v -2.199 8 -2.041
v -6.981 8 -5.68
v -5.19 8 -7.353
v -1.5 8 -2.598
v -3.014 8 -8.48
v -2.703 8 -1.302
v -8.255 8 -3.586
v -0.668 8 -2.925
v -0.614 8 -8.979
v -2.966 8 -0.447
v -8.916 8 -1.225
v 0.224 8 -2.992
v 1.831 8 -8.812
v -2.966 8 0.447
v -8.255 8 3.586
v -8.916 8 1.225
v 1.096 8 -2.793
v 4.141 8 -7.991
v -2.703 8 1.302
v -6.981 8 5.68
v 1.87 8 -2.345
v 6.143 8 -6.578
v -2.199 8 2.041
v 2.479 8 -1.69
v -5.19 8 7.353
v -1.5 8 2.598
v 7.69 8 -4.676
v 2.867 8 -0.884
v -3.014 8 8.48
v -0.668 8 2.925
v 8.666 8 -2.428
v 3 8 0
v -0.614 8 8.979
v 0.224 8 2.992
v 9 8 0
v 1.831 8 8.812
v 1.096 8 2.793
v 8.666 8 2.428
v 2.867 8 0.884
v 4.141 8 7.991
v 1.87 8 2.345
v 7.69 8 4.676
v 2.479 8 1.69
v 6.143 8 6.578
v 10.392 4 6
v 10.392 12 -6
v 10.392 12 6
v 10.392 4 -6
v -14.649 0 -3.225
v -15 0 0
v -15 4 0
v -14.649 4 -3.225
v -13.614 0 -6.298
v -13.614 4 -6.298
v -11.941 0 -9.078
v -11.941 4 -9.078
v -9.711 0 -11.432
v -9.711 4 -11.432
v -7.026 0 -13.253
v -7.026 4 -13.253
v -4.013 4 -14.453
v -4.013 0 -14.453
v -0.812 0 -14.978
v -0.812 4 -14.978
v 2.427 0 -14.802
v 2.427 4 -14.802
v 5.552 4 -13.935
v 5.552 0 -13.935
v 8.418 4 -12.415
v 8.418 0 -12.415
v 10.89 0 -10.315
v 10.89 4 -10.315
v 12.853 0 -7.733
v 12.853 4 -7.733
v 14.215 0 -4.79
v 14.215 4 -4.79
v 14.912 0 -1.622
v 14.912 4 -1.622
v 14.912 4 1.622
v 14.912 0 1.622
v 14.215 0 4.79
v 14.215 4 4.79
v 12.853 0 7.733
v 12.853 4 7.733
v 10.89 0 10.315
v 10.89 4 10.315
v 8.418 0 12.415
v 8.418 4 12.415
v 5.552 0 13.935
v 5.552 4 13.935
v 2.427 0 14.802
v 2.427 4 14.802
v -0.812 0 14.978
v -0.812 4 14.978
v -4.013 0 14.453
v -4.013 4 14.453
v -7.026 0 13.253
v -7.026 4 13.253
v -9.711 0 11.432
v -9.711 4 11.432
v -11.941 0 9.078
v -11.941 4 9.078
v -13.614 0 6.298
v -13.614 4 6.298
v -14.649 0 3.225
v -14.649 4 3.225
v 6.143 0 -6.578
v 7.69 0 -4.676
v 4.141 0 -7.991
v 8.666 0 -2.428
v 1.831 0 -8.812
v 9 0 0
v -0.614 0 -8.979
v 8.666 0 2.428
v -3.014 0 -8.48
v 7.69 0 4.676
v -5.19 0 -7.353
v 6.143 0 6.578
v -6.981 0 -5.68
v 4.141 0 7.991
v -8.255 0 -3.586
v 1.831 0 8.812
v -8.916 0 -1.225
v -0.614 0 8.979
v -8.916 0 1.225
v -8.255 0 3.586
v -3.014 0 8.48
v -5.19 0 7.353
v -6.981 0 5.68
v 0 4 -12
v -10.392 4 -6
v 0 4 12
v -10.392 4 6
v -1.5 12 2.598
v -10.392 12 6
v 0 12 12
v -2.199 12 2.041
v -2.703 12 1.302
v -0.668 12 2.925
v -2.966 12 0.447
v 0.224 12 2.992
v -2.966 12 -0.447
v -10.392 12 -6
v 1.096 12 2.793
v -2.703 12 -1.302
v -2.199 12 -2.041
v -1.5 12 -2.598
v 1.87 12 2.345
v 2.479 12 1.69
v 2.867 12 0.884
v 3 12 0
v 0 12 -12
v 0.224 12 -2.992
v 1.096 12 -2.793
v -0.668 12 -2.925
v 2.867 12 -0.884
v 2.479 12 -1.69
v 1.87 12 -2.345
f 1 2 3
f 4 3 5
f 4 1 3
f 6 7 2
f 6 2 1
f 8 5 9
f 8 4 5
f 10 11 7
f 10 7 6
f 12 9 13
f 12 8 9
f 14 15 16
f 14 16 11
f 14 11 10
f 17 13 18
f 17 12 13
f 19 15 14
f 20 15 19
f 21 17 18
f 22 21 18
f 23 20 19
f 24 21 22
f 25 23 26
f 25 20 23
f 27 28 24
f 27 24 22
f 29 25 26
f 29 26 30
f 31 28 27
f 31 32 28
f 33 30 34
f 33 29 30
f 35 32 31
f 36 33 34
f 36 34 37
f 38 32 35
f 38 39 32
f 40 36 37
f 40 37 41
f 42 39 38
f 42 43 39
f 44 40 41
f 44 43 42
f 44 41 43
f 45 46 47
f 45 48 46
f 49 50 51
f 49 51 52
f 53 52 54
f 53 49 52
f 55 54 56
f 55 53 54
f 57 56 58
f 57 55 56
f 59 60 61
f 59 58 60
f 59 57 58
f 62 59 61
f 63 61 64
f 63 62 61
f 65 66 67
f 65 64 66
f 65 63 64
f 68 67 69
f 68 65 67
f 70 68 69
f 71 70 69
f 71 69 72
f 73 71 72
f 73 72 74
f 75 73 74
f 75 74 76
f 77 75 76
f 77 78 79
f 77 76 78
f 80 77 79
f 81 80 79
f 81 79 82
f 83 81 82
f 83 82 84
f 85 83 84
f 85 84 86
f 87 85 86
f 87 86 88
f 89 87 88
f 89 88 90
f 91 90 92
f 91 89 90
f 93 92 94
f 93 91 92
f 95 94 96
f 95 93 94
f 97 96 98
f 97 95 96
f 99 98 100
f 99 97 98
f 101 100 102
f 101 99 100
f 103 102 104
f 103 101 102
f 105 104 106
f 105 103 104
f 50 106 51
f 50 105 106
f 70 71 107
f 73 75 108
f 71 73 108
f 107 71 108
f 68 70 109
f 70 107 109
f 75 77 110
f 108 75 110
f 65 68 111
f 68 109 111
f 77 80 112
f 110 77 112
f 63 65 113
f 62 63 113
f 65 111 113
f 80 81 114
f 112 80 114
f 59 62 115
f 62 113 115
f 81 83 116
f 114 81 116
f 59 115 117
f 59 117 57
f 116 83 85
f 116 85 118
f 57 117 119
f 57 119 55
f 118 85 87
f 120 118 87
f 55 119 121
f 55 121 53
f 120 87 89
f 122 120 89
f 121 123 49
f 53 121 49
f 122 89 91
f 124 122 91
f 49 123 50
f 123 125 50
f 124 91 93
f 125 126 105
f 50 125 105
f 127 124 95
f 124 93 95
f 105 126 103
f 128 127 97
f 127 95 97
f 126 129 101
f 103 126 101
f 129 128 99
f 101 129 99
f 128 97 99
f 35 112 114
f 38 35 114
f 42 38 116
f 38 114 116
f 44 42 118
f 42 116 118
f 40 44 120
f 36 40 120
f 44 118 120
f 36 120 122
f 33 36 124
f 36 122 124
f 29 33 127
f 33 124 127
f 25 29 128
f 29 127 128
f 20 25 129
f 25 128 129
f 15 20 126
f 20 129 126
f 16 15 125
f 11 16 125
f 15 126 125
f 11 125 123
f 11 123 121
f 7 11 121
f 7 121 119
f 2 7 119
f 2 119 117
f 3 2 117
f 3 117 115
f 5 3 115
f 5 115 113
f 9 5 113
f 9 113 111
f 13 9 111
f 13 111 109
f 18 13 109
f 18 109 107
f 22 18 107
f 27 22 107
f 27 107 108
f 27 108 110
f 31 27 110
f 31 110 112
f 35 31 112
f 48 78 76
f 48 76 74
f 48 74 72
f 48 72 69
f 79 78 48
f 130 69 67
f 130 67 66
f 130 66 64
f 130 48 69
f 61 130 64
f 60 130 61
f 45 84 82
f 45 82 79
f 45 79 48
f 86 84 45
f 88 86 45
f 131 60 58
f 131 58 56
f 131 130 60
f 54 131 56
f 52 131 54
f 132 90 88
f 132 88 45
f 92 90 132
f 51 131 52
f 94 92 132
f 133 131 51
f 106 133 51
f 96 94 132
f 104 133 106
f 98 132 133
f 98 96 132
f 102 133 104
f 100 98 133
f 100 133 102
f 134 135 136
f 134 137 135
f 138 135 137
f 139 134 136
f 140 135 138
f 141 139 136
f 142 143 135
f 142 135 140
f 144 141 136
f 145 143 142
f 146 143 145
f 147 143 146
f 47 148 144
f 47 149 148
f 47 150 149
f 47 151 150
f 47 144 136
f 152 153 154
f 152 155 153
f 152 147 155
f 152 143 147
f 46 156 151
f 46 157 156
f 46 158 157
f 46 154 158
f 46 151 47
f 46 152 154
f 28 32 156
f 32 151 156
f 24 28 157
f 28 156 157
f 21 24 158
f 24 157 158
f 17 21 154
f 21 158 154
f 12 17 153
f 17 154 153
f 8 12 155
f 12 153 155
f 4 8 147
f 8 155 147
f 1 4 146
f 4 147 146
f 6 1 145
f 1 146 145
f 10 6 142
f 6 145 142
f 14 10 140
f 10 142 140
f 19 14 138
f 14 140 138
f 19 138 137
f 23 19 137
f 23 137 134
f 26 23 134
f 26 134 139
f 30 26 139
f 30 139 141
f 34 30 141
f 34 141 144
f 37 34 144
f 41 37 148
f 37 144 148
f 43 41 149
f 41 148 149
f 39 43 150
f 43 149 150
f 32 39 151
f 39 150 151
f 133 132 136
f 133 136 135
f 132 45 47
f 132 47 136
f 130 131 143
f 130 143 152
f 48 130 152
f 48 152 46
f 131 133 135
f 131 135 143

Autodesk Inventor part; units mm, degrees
ref_plane "YZ Plane" through (0, 0, 0) normal (1, 0, 0) x (0, 1, 0)
ref_plane "XZ Plane" through (0, 0, 0) normal (0, 1, 0) x (-1, 0, 0)
ref_plane "XY Plane" through (0, 0, 0) normal (0, 0, 1) x (1, 0, 0)
sketch "Boceto1" plane through (0, 0, 0) normal (0, 1, 0) x (-1, 0, 0)
  circle A0 centre (0, 0) radius 15
  dimension "d0" = 30
extrude "Extrusión1" add sketch "Boceto1" along normal blind 4
sketch "Boceto2" plane through (0, 4, 0) normal (0, 1, 0) x (1, 0, 0)
  line L0 (10.3923, 6) -> (10.3923, -6)
  line L1 (10.3923, -6) -> (0, -12)
  line L2 (0, -12) -> (-10.3923, -6)
  line L3 (-10.3923, -6) -> (-10.3923, 6)
  line L4 (-10.3923, 6) -> (0, 12)
  line L5 (0, 12) -> (10.3923, 6)
  point P0 (0, 0)
  point P1 (0, 0)
  point P2 (10.3923, 0)
  dimension "d3" = 12
extrude "Extrusión2" add sketch "Boceto2" along normal blind 8
sketch "Boceto3" plane through (0, 0, 0) normal (0, -1, 0) x (1, 0, 0)
  circle A0 centre (0, 0) radius 9
  dimension "d6" = 18
extrude "Extrusión3" cut sketch "Boceto3" against normal blind 8
sketch "Boceto4" plane through (0, 12, 0) normal (0, 1, 0) x (1, 0, 0)
  circle A0 centre (0, 0) radius 3
  dimension "d9" = 6
extrude "Extrusión4" cut sketch "Boceto4" against normal up to next
properties part number "shocks_mover" material "Goma"
